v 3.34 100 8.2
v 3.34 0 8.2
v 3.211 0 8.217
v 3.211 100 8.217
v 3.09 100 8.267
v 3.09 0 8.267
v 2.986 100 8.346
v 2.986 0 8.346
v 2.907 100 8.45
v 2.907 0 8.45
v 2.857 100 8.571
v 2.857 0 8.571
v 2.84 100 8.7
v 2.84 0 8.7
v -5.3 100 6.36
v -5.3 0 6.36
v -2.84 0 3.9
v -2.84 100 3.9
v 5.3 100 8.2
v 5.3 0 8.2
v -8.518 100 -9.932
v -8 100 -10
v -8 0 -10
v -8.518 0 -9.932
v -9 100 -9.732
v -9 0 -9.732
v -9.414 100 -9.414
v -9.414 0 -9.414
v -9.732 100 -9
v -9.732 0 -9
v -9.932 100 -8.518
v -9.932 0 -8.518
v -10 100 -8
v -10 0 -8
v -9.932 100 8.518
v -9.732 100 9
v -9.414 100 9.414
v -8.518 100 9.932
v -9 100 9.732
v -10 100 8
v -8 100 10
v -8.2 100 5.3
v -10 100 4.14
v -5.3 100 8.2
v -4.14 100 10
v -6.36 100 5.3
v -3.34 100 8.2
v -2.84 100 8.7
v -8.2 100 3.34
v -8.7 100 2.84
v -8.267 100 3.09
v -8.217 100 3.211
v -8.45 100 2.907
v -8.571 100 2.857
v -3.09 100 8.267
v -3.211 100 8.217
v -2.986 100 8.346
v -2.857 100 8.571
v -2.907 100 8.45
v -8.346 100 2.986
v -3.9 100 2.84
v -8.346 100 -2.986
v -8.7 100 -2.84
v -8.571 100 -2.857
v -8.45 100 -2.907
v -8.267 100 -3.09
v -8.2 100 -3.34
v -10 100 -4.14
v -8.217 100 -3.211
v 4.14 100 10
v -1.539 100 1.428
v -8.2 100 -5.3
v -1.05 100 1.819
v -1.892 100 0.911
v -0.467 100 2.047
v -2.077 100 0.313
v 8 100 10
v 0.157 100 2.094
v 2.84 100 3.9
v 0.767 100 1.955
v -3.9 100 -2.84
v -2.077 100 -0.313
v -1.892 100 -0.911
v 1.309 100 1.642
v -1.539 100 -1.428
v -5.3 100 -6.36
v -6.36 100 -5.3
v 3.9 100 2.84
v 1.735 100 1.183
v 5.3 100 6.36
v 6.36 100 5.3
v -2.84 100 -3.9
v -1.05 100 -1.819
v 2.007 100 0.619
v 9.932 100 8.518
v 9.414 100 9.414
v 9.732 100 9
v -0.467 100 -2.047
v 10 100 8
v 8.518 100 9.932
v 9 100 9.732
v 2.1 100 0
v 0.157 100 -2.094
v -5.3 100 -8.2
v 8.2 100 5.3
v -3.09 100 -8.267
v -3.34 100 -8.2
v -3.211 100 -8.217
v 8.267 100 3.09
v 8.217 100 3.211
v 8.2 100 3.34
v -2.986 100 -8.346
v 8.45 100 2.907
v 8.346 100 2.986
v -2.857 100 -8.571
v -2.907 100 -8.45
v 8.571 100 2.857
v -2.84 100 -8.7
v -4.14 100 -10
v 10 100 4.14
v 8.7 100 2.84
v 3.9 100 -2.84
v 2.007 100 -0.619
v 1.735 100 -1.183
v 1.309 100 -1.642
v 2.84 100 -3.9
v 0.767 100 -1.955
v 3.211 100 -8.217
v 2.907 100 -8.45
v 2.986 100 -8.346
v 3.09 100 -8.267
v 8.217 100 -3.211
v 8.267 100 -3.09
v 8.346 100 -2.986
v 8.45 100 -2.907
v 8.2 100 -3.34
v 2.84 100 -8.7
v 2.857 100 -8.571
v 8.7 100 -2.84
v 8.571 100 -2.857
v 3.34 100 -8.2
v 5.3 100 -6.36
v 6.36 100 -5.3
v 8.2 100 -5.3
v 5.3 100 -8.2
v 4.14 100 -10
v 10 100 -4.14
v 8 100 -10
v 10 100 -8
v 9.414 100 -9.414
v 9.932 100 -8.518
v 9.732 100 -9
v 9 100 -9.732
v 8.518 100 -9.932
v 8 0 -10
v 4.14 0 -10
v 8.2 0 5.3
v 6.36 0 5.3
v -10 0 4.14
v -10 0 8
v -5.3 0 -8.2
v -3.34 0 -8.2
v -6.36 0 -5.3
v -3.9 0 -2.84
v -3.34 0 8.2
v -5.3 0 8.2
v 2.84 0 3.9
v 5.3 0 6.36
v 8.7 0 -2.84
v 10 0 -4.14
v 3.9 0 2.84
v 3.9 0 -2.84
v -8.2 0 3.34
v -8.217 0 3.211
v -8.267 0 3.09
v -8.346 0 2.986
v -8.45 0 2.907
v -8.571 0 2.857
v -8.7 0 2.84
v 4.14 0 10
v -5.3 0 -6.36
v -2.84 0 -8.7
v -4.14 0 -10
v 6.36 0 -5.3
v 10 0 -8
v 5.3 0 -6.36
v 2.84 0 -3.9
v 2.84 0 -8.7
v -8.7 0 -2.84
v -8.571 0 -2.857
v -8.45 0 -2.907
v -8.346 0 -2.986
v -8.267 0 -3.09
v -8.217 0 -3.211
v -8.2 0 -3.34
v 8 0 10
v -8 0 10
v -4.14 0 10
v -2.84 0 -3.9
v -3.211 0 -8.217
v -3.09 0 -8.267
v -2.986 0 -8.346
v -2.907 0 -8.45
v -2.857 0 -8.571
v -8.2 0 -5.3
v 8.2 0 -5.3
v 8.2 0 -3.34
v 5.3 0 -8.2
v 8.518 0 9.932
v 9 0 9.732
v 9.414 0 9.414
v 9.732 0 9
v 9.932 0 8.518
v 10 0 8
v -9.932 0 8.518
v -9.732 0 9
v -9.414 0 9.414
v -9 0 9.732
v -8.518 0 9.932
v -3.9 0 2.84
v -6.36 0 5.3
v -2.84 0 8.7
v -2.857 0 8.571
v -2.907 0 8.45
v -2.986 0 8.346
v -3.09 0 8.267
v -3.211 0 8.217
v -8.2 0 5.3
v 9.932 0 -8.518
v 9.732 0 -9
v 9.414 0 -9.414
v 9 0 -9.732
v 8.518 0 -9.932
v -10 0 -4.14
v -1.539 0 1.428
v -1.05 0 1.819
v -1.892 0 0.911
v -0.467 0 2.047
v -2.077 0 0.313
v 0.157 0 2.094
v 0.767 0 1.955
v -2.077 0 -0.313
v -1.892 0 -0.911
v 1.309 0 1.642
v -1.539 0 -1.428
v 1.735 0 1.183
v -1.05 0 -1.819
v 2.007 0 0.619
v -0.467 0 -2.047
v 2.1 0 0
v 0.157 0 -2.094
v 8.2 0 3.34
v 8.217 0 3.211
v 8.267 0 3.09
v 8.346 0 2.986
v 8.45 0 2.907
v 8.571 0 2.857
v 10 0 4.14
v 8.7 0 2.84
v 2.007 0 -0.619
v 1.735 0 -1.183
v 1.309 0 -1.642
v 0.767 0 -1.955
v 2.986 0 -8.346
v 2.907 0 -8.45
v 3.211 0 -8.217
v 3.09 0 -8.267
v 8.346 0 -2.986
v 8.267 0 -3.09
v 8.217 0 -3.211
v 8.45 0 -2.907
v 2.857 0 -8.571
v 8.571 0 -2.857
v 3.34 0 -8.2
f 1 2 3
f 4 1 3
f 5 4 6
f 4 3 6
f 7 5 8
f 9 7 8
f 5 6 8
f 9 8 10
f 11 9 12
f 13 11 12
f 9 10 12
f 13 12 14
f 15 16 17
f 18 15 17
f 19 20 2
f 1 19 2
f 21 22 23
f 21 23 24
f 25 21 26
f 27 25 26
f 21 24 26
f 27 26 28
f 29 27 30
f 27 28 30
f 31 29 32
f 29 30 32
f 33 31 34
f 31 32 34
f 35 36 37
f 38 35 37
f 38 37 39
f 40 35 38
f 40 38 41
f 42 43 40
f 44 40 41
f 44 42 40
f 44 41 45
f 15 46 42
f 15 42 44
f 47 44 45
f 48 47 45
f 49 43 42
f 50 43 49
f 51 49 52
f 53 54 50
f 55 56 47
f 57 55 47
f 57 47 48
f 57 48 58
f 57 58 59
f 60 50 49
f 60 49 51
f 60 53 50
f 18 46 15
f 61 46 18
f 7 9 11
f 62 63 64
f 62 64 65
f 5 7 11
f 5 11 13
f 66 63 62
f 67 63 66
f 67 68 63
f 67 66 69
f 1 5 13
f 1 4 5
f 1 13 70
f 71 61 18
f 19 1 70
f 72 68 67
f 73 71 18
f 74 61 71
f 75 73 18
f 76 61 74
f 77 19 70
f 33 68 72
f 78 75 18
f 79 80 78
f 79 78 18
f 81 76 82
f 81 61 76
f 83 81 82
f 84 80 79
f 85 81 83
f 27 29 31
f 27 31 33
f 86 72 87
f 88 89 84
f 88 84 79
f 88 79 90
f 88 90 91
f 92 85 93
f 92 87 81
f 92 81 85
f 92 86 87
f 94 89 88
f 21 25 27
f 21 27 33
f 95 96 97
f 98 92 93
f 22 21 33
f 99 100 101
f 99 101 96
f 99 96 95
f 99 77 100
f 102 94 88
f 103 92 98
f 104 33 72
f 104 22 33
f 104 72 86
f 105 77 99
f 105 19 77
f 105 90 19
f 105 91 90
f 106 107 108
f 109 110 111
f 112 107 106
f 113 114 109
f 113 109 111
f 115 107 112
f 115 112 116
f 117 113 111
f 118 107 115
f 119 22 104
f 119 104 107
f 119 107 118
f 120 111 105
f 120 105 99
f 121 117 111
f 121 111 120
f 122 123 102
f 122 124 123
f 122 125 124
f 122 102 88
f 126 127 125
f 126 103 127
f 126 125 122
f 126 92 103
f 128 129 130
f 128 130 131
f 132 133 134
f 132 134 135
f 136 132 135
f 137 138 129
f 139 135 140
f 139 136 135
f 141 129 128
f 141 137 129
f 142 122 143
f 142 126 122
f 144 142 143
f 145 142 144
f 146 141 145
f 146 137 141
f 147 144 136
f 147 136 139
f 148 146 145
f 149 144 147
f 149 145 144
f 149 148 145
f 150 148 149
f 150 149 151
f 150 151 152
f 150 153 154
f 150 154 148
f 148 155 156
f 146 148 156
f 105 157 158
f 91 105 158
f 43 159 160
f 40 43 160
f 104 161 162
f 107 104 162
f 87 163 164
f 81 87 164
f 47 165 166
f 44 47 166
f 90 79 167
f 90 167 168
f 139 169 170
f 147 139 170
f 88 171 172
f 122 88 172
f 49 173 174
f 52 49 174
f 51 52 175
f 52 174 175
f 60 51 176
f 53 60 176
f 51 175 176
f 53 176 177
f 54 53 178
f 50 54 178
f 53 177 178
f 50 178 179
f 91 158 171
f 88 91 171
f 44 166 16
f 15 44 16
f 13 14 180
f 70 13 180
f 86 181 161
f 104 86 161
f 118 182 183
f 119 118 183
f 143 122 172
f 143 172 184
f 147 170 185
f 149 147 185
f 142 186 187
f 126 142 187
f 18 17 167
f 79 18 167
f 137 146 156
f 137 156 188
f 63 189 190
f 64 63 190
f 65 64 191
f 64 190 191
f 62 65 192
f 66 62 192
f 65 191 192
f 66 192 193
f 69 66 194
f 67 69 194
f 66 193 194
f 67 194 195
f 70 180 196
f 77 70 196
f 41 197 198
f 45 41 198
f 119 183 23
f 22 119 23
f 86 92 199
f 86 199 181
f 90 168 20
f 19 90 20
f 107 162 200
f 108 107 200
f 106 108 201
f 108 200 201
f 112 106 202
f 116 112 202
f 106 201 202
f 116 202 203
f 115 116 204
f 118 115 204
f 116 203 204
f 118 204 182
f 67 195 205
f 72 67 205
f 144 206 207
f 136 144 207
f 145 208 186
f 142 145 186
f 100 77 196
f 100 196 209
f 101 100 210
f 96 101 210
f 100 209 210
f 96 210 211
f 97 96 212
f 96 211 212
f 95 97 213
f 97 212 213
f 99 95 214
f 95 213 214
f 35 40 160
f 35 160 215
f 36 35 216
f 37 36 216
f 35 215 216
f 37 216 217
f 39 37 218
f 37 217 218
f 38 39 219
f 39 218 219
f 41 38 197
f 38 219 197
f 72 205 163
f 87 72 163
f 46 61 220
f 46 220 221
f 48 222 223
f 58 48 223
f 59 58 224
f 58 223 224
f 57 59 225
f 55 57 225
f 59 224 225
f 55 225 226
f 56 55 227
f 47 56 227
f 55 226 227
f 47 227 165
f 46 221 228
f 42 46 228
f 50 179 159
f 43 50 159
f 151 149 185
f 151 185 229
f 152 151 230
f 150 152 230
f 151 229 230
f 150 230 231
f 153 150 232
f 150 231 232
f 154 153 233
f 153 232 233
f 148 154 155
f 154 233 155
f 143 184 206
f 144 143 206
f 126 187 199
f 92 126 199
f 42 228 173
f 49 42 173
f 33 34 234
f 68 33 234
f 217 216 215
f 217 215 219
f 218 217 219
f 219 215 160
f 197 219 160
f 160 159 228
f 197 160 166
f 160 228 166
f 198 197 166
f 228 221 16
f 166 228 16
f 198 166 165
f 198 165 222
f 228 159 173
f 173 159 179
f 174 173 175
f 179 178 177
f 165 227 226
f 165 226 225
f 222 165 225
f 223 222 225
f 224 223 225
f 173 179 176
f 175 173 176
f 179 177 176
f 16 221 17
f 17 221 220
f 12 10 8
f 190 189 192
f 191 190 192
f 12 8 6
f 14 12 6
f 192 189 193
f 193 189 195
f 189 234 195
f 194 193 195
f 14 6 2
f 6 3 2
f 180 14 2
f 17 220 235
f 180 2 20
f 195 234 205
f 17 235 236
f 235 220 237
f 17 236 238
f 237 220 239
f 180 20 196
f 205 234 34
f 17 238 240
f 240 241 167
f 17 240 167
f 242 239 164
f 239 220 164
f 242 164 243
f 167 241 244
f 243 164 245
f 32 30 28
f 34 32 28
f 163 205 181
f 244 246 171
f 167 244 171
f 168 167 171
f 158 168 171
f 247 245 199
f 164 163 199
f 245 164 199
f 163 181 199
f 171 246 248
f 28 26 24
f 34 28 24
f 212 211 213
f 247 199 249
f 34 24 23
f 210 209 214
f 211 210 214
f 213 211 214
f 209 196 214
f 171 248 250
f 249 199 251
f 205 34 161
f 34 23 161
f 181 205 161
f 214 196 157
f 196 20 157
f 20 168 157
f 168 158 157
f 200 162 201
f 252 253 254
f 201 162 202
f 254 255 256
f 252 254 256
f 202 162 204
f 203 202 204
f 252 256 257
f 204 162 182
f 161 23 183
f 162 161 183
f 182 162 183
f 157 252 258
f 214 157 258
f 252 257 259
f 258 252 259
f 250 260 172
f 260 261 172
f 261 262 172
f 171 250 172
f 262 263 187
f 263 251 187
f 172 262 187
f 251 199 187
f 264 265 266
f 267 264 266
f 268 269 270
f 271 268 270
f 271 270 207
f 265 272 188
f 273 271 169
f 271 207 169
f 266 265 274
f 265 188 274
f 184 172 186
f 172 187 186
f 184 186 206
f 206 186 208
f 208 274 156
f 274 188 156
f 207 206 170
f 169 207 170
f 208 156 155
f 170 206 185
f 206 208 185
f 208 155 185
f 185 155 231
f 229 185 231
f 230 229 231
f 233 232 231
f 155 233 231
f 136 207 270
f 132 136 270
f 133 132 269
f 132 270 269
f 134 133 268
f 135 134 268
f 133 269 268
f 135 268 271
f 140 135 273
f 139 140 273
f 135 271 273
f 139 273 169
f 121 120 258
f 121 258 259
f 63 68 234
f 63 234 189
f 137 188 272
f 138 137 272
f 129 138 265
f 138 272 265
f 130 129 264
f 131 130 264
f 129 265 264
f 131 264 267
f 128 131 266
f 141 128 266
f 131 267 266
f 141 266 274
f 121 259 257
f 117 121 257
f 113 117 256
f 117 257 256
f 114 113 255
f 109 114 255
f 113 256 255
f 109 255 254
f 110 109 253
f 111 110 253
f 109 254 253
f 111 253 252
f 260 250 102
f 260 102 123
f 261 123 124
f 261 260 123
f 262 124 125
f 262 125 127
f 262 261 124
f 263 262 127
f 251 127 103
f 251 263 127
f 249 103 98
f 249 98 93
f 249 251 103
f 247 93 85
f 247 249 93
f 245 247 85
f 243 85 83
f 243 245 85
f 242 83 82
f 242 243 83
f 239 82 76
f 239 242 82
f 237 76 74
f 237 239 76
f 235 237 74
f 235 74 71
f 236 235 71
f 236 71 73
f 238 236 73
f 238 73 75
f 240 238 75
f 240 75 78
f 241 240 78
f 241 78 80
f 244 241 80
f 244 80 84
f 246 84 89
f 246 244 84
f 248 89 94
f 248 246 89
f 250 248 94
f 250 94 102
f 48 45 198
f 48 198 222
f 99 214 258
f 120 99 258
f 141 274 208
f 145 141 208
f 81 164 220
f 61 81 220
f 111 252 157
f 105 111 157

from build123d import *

# Parameters (mm, degrees)
CROQUIS1_R              = 2.1
SALIENTE_EXTRUIR2_DEPTH = 100


with BuildPart() as part:
    # Croquis1 → Saliente-Extruir2 (new body)
    with BuildSketch(Plane(origin=(0, 0, 0), x_dir=(1, 0, 0), z_dir=(0, 1, 0))):
        with BuildLine():
            Line((3.9, -2.84), (3.9, 2.84))
            Line((3.9, 2.84), (6.36, 5.3))
            Line((6.36, 5.3), (8.2, 5.3))
            Line((8.2, 5.3), (8.2, 3.34))
            ThreePointArc((8.2, 3.34), (8.346446609, 2.986446609), (8.7, 2.84))
            Line((8.7, 2.84), (10, 4.14))
            Line((10, 4.14), (10, 8))
            ThreePointArc((10, 8), (9.414213562, 9.414213562), (8, 10))
            Line((8, 10), (4.14, 10))
            Line((4.14, 10), (2.84, 8.7))
            ThreePointArc((2.84, 8.7), (2.986446609, 8.346446609), (3.34, 8.2))
            Line((3.34, 8.2), (5.3, 8.2))
            Line((5.3, 8.2), (5.3, 6.36))
            Line((5.3, 6.36), (2.84, 3.9))
            Line((2.84, 3.9), (-2.84, 3.9))
            Line((-2.84, 3.9), (-5.3, 6.36))
            Line((-5.3, 6.36), (-5.3, 8.2))
            Line((-5.3, 8.2), (-3.34, 8.2))
            ThreePointArc((-3.34, 8.2), (-2.986446609, 8.346446609), (-2.84, 8.7))
            Line((-2.84, 8.7), (-4.14, 10))
            Line((-4.14, 10), (-8, 10))
            ThreePointArc((-8, 10), (-9.414213562, 9.414213562), (-10, 8))
            Line((-10, 8), (-10, 4.14))
            Line((-10, 4.14), (-8.7, 2.84))
            ThreePointArc((-8.7, 2.84), (-8.346446609, 2.986446609), (-8.2, 3.34))
            Line((-8.2, 3.34), (-8.2, 5.3))
            Line((-8.2, 5.3), (-6.36, 5.3))
            Line((-6.36, 5.3), (-3.9, 2.84))
            Line((-3.9, 2.84), (-3.9, -2.84))
            Line((-3.9, -2.84), (-6.36, -5.3))
            Line((-6.36, -5.3), (-8.2, -5.3))
            Line((-8.2, -5.3), (-8.2, -3.34))
            ThreePointArc((-8.2, -3.34), (-8.346446609, -2.986446609), (-8.7, -2.84))
            Line((-8.7, -2.84), (-10, -4.14))
            Line((-10, -4.14), (-10, -8))
            ThreePointArc((-10, -8), (-9.414213562, -9.414213562), (-8, -10))
            Line((-8, -10), (-4.14, -10))
            Line((-4.14, -10), (-2.84, -8.7))
            ThreePointArc((-2.84, -8.7), (-2.986446609, -8.346446609), (-3.34, -8.2))
            Line((-3.34, -8.2), (-5.3, -8.2))
            Line((-5.3, -8.2), (-5.3, -6.36))
            Line((-5.3, -6.36), (-2.84, -3.9))
            Line((-2.84, -3.9), (2.84, -3.9))
            Line((2.84, -3.9), (5.3, -6.36))
            Line((5.3, -6.36), (5.3, -8.2))
            Line((5.3, -8.2), (3.34, -8.2))
            ThreePointArc((3.34, -8.2), (2.986446609, -8.346446609), (2.84, -8.7))
            Line((2.84, -8.7), (4.14, -10))
            Line((4.14, -10), (8, -10))
            ThreePointArc((8, -10), (9.414213562, -9.414213562), (10, -8))
            Line((10, -8), (10, -4.14))
            Line((10, -4.14), (8.7, -2.84))
            ThreePointArc((8.7, -2.84), (8.346446609, -2.986446609), (8.2, -3.34))
            Line((8.2, -3.34), (8.2, -5.3))
            Line((8.2, -5.3), (6.36, -5.3))
            Line((6.36, -5.3), (3.9, -2.84))
        make_face()
        Circle(CROQUIS1_R, mode=Mode.SUBTRACT)
    extrude(amount=SALIENTE_EXTRUIR2_DEPTH)


solid = part.part
